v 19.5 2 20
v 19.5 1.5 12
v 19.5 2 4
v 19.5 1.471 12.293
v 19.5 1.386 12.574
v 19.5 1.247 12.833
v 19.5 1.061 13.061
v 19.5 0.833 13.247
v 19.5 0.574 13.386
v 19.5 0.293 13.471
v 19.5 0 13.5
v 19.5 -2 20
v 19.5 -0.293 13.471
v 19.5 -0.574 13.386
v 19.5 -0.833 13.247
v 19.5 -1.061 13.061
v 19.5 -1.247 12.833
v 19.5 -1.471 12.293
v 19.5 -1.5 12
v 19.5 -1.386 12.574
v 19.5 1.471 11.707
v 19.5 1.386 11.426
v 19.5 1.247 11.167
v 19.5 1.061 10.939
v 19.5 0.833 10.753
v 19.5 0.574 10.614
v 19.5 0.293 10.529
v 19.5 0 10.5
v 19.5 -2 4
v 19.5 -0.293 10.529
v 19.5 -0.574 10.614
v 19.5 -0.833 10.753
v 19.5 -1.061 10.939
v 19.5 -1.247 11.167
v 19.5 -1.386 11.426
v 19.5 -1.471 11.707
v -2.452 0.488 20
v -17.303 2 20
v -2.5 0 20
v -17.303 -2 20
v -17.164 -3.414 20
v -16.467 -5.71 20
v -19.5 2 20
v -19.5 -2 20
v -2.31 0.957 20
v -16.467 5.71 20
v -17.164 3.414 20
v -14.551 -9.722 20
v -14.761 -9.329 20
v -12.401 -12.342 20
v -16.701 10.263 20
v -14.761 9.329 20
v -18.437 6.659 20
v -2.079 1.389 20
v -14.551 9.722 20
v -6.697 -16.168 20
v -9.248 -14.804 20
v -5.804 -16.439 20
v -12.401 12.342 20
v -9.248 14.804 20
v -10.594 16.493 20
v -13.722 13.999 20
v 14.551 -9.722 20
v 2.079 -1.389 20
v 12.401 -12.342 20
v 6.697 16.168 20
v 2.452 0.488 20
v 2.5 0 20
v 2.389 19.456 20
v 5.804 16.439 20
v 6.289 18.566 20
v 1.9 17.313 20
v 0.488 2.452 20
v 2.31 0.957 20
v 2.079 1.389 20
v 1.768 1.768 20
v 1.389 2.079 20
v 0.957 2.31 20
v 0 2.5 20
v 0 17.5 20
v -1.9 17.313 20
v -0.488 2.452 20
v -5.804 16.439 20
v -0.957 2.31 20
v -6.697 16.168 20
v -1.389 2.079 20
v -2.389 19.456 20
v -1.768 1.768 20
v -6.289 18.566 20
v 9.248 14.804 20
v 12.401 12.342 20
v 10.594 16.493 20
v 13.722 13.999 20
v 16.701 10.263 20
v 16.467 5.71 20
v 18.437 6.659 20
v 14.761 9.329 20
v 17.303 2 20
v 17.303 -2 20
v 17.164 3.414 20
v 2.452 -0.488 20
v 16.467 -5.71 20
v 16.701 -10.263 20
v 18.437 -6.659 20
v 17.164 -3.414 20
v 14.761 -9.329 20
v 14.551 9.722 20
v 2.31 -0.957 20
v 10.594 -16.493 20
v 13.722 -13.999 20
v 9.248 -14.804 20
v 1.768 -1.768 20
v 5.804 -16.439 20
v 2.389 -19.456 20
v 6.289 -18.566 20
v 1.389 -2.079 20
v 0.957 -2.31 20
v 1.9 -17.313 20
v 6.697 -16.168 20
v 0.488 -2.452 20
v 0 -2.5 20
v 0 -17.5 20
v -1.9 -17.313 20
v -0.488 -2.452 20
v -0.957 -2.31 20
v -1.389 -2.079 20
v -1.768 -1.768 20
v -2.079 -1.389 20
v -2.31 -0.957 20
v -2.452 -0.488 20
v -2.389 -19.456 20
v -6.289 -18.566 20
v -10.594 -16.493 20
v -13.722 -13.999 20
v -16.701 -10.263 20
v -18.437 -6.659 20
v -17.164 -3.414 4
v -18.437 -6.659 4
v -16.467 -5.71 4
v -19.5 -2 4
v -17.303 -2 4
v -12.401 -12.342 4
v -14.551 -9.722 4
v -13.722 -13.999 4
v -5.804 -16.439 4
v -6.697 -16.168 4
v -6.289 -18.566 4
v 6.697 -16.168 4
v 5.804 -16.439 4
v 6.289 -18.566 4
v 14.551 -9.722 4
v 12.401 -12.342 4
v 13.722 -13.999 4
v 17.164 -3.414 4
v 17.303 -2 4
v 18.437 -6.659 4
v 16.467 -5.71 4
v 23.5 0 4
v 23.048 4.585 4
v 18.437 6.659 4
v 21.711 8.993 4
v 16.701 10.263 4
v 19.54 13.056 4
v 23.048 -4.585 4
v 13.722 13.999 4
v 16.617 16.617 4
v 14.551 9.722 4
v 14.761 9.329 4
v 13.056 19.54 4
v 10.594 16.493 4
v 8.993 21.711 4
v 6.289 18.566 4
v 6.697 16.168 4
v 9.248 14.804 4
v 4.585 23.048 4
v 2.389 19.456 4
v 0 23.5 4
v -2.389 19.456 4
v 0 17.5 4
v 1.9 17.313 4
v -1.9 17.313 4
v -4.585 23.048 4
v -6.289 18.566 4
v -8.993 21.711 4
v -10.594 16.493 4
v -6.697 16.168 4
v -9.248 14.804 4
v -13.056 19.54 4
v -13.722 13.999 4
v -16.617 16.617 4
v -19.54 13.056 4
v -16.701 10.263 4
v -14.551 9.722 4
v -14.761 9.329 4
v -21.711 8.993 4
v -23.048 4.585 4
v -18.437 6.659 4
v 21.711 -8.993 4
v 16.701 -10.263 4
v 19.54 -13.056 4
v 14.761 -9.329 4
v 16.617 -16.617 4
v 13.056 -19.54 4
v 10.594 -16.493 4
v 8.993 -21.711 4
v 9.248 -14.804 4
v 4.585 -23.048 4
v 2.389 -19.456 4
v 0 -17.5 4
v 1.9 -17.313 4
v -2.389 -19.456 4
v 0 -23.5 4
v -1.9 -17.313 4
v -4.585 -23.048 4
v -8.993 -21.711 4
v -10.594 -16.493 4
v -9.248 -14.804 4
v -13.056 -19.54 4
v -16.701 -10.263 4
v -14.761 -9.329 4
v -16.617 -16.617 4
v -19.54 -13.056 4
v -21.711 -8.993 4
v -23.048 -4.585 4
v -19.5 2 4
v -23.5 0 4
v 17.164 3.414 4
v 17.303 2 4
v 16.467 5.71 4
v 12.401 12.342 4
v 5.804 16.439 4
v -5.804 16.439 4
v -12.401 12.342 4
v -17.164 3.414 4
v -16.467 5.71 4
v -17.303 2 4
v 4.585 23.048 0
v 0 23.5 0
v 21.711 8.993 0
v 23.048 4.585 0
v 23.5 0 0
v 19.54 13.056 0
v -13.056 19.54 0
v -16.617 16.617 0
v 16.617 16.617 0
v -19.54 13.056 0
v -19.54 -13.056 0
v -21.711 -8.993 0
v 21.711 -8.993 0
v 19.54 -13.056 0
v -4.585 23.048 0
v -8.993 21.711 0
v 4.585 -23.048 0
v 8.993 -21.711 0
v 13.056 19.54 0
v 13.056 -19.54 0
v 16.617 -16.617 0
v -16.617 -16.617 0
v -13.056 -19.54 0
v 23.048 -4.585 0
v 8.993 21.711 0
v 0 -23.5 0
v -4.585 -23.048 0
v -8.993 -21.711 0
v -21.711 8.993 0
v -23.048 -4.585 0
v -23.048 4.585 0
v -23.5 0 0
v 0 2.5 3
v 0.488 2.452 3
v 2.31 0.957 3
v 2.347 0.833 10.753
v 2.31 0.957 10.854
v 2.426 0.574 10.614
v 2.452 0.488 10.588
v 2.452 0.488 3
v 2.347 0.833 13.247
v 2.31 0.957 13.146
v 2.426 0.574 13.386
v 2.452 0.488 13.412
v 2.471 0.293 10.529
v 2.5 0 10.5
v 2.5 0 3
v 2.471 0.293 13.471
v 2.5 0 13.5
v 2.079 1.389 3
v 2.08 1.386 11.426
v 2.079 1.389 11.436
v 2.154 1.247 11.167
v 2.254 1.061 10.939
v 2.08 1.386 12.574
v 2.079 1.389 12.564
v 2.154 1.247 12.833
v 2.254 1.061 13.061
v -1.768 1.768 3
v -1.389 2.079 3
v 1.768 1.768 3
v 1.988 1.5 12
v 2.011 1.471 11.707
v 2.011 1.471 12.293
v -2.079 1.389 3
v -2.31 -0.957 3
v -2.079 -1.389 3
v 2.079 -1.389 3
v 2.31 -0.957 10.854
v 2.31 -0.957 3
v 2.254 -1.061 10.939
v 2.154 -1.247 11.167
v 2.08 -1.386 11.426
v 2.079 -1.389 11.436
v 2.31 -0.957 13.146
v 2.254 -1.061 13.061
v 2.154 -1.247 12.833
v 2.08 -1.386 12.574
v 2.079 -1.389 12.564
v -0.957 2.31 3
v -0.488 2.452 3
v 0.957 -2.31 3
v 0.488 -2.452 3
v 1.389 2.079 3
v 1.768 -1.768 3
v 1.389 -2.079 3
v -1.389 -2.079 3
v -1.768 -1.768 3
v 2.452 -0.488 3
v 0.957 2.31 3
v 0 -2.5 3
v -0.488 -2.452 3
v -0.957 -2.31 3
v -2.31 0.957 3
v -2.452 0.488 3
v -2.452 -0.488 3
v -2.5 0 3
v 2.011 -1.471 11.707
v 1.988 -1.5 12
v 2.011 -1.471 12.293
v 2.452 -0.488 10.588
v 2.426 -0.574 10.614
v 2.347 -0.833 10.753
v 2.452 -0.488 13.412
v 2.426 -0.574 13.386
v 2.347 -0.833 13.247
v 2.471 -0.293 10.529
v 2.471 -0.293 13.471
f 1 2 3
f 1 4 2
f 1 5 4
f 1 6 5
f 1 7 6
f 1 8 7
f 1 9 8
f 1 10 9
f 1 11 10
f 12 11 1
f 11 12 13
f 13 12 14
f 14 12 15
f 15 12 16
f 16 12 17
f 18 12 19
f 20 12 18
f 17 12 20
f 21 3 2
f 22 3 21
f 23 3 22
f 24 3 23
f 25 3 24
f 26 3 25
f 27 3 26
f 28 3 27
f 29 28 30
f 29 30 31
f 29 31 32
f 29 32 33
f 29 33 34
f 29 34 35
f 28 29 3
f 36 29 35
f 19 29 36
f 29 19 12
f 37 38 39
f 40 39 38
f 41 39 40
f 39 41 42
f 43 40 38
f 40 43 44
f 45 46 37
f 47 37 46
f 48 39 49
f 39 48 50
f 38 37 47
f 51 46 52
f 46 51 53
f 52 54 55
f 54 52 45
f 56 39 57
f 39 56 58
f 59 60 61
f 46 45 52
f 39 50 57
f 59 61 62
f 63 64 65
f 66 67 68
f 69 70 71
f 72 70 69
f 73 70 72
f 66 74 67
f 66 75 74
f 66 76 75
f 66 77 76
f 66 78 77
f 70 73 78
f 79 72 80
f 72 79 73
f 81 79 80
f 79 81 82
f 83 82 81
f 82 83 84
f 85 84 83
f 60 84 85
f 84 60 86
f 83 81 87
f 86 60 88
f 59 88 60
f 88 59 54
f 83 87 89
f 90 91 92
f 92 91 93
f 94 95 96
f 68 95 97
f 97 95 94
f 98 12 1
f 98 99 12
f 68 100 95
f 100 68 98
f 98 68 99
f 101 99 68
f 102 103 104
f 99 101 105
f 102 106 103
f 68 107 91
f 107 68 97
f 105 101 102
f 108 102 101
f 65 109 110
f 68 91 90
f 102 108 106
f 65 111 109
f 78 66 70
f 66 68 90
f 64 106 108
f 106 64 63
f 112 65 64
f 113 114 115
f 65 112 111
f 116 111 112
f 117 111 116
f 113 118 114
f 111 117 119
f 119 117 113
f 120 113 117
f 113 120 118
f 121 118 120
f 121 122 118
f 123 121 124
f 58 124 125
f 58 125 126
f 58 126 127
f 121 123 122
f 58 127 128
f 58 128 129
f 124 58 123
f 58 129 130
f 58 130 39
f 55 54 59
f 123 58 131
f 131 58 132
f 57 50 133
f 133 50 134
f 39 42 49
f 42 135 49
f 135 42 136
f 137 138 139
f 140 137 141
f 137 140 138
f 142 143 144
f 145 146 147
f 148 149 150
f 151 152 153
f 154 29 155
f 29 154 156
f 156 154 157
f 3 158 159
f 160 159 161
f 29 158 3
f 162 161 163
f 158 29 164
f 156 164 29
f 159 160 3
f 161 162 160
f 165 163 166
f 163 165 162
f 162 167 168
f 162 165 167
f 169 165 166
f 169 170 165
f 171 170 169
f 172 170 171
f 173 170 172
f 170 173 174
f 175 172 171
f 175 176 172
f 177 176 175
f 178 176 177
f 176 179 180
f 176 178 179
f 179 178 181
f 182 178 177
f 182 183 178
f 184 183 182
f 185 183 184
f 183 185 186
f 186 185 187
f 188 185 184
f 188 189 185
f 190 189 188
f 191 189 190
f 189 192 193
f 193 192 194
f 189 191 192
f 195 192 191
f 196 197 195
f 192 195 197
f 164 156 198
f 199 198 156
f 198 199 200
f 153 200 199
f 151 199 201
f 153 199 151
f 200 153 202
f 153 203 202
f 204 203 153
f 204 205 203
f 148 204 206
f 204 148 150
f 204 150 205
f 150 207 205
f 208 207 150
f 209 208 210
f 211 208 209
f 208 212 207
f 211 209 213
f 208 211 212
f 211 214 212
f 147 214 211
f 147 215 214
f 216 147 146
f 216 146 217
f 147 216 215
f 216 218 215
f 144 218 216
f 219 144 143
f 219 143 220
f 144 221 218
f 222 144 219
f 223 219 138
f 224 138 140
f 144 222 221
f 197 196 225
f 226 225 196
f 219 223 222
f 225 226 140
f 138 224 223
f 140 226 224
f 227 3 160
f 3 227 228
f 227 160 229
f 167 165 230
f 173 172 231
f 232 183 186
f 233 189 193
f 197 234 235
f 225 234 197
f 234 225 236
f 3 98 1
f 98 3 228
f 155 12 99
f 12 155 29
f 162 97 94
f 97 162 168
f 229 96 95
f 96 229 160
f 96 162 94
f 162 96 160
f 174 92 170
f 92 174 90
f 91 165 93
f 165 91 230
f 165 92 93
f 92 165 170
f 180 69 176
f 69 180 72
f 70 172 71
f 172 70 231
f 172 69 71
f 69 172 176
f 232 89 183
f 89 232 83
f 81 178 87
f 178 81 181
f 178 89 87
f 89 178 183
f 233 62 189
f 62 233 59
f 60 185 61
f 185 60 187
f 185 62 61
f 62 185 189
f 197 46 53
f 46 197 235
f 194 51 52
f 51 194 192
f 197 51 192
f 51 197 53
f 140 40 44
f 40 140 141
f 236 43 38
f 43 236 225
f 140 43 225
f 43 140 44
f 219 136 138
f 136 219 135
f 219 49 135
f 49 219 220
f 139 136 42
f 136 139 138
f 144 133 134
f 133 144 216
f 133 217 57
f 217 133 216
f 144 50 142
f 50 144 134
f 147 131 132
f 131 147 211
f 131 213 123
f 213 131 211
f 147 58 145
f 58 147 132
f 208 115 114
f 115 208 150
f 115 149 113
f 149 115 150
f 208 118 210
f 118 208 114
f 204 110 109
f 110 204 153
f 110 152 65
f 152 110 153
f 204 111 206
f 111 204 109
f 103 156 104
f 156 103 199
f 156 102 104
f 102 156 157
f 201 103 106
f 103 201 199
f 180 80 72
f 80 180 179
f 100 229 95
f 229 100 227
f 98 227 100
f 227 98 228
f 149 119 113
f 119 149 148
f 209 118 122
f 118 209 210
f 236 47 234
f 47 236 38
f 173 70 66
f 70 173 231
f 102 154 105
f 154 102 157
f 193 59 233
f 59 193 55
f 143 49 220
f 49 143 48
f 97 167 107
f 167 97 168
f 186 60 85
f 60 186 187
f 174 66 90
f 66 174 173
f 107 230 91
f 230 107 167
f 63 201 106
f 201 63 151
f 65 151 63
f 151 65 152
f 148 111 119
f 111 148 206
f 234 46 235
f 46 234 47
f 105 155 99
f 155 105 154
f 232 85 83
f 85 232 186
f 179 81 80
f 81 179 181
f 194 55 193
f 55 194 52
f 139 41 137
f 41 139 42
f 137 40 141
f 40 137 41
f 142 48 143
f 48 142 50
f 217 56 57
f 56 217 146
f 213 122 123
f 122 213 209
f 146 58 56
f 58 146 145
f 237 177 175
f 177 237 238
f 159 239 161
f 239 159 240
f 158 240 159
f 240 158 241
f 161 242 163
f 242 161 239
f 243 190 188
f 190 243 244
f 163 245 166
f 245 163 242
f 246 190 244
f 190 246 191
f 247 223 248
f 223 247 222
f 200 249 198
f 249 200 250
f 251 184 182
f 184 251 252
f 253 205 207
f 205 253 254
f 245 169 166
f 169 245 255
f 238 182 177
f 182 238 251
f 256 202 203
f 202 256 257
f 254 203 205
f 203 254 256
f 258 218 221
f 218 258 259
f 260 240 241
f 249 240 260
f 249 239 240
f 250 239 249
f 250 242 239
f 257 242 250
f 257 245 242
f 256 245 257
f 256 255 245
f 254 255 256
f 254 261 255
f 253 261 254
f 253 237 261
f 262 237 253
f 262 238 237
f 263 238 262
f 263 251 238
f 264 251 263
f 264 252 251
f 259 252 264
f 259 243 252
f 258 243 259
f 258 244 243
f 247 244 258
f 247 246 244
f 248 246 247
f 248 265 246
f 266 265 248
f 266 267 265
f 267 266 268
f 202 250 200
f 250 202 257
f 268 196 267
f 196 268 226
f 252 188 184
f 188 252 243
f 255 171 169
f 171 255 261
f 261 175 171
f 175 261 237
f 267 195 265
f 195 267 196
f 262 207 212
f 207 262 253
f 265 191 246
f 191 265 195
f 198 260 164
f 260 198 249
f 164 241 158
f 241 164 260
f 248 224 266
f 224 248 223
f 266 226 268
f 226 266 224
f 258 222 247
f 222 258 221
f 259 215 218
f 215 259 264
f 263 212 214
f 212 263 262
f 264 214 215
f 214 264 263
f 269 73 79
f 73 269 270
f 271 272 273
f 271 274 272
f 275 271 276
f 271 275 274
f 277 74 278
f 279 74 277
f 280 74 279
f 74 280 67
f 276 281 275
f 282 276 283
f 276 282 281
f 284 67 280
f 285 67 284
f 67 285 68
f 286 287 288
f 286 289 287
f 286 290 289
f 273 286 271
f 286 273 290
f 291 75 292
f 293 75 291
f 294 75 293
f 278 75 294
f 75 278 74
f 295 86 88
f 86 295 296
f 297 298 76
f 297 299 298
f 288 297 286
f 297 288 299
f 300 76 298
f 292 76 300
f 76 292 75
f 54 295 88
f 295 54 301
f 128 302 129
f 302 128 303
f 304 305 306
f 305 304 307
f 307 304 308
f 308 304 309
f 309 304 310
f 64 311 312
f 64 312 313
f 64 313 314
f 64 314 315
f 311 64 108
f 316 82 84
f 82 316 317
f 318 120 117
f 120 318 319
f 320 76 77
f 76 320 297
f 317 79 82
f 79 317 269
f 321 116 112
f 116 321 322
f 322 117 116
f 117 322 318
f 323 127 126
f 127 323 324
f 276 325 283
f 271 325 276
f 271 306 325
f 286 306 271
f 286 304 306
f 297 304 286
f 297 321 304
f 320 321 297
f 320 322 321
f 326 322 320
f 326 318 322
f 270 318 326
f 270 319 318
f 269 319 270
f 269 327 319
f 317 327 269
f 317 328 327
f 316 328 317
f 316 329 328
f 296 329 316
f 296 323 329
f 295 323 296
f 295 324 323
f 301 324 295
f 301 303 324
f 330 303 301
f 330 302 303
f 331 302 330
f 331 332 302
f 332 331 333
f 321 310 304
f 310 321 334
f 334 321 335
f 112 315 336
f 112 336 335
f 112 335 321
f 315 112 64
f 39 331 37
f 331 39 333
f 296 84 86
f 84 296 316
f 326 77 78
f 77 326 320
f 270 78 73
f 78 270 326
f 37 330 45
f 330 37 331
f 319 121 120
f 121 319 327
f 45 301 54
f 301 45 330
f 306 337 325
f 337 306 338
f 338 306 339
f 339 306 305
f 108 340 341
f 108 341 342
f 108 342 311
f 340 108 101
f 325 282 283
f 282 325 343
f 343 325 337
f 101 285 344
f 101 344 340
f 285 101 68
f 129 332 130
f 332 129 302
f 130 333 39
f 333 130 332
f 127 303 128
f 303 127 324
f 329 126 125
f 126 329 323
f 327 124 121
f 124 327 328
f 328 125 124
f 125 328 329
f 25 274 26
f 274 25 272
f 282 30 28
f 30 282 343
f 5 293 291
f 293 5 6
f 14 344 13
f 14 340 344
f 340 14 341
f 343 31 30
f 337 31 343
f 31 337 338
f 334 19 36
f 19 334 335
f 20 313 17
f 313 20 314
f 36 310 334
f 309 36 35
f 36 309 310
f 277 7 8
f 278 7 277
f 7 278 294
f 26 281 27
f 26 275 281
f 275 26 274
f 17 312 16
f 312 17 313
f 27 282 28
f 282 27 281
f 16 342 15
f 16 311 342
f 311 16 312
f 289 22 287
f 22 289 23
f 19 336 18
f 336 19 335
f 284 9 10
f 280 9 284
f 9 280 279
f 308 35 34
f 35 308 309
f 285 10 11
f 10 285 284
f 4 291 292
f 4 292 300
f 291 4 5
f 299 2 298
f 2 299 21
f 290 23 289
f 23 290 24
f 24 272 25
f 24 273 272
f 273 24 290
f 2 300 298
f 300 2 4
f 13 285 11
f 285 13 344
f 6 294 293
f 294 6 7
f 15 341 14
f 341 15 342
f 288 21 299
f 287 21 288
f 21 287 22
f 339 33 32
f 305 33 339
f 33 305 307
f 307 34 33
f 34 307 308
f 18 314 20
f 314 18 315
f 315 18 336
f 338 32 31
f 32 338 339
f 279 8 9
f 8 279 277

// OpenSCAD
$fn = 32;

// ----------------------------------------------------------------------
// Control knob: skirt knob with grip ribs
// ----------------------------------------------------------------------

// --- parameters (mm) ---
skirt_d = 47;             // skirt diameter
skirt_t = 4;              // skirt thickness
rib_w = 4;                // grip rib width
rib_out = 3;              // grip rib radial protrusion
n_ribs = 14;              // number of grip ribs
knob_d = 35;              // knob body diameter
knob_h = 16;              // knob body height
bore_d = 5;               // shaft bore diameter
set_d = 3;                // set screw bore diameter

rib_step = 360 / n_ribs;  // rib angular step
total_h = skirt_t + knob_h;  // overall height

difference() {
  union() {
    translate([0, 0, skirt_t]) cylinder(h = knob_h, d = knob_d);
    cylinder(h = skirt_t, d = skirt_d);
    for (i = [0 : n_ribs - 1])
      rotate([0, 0, i * rib_step])
        translate([knob_d / 2 - 1, -rib_w / 2, skirt_t])
          cube([rib_out, rib_w, knob_h]);
  }
  translate([0, 0, skirt_t - 1]) cylinder(h = knob_h + 2, d = bore_d);
  translate([-1, 0, skirt_t + knob_h / 2]) rotate([0, 90, 0])
    cylinder(h = knob_d / 2 + bore_d / 2 + 2, d = set_d);
}
